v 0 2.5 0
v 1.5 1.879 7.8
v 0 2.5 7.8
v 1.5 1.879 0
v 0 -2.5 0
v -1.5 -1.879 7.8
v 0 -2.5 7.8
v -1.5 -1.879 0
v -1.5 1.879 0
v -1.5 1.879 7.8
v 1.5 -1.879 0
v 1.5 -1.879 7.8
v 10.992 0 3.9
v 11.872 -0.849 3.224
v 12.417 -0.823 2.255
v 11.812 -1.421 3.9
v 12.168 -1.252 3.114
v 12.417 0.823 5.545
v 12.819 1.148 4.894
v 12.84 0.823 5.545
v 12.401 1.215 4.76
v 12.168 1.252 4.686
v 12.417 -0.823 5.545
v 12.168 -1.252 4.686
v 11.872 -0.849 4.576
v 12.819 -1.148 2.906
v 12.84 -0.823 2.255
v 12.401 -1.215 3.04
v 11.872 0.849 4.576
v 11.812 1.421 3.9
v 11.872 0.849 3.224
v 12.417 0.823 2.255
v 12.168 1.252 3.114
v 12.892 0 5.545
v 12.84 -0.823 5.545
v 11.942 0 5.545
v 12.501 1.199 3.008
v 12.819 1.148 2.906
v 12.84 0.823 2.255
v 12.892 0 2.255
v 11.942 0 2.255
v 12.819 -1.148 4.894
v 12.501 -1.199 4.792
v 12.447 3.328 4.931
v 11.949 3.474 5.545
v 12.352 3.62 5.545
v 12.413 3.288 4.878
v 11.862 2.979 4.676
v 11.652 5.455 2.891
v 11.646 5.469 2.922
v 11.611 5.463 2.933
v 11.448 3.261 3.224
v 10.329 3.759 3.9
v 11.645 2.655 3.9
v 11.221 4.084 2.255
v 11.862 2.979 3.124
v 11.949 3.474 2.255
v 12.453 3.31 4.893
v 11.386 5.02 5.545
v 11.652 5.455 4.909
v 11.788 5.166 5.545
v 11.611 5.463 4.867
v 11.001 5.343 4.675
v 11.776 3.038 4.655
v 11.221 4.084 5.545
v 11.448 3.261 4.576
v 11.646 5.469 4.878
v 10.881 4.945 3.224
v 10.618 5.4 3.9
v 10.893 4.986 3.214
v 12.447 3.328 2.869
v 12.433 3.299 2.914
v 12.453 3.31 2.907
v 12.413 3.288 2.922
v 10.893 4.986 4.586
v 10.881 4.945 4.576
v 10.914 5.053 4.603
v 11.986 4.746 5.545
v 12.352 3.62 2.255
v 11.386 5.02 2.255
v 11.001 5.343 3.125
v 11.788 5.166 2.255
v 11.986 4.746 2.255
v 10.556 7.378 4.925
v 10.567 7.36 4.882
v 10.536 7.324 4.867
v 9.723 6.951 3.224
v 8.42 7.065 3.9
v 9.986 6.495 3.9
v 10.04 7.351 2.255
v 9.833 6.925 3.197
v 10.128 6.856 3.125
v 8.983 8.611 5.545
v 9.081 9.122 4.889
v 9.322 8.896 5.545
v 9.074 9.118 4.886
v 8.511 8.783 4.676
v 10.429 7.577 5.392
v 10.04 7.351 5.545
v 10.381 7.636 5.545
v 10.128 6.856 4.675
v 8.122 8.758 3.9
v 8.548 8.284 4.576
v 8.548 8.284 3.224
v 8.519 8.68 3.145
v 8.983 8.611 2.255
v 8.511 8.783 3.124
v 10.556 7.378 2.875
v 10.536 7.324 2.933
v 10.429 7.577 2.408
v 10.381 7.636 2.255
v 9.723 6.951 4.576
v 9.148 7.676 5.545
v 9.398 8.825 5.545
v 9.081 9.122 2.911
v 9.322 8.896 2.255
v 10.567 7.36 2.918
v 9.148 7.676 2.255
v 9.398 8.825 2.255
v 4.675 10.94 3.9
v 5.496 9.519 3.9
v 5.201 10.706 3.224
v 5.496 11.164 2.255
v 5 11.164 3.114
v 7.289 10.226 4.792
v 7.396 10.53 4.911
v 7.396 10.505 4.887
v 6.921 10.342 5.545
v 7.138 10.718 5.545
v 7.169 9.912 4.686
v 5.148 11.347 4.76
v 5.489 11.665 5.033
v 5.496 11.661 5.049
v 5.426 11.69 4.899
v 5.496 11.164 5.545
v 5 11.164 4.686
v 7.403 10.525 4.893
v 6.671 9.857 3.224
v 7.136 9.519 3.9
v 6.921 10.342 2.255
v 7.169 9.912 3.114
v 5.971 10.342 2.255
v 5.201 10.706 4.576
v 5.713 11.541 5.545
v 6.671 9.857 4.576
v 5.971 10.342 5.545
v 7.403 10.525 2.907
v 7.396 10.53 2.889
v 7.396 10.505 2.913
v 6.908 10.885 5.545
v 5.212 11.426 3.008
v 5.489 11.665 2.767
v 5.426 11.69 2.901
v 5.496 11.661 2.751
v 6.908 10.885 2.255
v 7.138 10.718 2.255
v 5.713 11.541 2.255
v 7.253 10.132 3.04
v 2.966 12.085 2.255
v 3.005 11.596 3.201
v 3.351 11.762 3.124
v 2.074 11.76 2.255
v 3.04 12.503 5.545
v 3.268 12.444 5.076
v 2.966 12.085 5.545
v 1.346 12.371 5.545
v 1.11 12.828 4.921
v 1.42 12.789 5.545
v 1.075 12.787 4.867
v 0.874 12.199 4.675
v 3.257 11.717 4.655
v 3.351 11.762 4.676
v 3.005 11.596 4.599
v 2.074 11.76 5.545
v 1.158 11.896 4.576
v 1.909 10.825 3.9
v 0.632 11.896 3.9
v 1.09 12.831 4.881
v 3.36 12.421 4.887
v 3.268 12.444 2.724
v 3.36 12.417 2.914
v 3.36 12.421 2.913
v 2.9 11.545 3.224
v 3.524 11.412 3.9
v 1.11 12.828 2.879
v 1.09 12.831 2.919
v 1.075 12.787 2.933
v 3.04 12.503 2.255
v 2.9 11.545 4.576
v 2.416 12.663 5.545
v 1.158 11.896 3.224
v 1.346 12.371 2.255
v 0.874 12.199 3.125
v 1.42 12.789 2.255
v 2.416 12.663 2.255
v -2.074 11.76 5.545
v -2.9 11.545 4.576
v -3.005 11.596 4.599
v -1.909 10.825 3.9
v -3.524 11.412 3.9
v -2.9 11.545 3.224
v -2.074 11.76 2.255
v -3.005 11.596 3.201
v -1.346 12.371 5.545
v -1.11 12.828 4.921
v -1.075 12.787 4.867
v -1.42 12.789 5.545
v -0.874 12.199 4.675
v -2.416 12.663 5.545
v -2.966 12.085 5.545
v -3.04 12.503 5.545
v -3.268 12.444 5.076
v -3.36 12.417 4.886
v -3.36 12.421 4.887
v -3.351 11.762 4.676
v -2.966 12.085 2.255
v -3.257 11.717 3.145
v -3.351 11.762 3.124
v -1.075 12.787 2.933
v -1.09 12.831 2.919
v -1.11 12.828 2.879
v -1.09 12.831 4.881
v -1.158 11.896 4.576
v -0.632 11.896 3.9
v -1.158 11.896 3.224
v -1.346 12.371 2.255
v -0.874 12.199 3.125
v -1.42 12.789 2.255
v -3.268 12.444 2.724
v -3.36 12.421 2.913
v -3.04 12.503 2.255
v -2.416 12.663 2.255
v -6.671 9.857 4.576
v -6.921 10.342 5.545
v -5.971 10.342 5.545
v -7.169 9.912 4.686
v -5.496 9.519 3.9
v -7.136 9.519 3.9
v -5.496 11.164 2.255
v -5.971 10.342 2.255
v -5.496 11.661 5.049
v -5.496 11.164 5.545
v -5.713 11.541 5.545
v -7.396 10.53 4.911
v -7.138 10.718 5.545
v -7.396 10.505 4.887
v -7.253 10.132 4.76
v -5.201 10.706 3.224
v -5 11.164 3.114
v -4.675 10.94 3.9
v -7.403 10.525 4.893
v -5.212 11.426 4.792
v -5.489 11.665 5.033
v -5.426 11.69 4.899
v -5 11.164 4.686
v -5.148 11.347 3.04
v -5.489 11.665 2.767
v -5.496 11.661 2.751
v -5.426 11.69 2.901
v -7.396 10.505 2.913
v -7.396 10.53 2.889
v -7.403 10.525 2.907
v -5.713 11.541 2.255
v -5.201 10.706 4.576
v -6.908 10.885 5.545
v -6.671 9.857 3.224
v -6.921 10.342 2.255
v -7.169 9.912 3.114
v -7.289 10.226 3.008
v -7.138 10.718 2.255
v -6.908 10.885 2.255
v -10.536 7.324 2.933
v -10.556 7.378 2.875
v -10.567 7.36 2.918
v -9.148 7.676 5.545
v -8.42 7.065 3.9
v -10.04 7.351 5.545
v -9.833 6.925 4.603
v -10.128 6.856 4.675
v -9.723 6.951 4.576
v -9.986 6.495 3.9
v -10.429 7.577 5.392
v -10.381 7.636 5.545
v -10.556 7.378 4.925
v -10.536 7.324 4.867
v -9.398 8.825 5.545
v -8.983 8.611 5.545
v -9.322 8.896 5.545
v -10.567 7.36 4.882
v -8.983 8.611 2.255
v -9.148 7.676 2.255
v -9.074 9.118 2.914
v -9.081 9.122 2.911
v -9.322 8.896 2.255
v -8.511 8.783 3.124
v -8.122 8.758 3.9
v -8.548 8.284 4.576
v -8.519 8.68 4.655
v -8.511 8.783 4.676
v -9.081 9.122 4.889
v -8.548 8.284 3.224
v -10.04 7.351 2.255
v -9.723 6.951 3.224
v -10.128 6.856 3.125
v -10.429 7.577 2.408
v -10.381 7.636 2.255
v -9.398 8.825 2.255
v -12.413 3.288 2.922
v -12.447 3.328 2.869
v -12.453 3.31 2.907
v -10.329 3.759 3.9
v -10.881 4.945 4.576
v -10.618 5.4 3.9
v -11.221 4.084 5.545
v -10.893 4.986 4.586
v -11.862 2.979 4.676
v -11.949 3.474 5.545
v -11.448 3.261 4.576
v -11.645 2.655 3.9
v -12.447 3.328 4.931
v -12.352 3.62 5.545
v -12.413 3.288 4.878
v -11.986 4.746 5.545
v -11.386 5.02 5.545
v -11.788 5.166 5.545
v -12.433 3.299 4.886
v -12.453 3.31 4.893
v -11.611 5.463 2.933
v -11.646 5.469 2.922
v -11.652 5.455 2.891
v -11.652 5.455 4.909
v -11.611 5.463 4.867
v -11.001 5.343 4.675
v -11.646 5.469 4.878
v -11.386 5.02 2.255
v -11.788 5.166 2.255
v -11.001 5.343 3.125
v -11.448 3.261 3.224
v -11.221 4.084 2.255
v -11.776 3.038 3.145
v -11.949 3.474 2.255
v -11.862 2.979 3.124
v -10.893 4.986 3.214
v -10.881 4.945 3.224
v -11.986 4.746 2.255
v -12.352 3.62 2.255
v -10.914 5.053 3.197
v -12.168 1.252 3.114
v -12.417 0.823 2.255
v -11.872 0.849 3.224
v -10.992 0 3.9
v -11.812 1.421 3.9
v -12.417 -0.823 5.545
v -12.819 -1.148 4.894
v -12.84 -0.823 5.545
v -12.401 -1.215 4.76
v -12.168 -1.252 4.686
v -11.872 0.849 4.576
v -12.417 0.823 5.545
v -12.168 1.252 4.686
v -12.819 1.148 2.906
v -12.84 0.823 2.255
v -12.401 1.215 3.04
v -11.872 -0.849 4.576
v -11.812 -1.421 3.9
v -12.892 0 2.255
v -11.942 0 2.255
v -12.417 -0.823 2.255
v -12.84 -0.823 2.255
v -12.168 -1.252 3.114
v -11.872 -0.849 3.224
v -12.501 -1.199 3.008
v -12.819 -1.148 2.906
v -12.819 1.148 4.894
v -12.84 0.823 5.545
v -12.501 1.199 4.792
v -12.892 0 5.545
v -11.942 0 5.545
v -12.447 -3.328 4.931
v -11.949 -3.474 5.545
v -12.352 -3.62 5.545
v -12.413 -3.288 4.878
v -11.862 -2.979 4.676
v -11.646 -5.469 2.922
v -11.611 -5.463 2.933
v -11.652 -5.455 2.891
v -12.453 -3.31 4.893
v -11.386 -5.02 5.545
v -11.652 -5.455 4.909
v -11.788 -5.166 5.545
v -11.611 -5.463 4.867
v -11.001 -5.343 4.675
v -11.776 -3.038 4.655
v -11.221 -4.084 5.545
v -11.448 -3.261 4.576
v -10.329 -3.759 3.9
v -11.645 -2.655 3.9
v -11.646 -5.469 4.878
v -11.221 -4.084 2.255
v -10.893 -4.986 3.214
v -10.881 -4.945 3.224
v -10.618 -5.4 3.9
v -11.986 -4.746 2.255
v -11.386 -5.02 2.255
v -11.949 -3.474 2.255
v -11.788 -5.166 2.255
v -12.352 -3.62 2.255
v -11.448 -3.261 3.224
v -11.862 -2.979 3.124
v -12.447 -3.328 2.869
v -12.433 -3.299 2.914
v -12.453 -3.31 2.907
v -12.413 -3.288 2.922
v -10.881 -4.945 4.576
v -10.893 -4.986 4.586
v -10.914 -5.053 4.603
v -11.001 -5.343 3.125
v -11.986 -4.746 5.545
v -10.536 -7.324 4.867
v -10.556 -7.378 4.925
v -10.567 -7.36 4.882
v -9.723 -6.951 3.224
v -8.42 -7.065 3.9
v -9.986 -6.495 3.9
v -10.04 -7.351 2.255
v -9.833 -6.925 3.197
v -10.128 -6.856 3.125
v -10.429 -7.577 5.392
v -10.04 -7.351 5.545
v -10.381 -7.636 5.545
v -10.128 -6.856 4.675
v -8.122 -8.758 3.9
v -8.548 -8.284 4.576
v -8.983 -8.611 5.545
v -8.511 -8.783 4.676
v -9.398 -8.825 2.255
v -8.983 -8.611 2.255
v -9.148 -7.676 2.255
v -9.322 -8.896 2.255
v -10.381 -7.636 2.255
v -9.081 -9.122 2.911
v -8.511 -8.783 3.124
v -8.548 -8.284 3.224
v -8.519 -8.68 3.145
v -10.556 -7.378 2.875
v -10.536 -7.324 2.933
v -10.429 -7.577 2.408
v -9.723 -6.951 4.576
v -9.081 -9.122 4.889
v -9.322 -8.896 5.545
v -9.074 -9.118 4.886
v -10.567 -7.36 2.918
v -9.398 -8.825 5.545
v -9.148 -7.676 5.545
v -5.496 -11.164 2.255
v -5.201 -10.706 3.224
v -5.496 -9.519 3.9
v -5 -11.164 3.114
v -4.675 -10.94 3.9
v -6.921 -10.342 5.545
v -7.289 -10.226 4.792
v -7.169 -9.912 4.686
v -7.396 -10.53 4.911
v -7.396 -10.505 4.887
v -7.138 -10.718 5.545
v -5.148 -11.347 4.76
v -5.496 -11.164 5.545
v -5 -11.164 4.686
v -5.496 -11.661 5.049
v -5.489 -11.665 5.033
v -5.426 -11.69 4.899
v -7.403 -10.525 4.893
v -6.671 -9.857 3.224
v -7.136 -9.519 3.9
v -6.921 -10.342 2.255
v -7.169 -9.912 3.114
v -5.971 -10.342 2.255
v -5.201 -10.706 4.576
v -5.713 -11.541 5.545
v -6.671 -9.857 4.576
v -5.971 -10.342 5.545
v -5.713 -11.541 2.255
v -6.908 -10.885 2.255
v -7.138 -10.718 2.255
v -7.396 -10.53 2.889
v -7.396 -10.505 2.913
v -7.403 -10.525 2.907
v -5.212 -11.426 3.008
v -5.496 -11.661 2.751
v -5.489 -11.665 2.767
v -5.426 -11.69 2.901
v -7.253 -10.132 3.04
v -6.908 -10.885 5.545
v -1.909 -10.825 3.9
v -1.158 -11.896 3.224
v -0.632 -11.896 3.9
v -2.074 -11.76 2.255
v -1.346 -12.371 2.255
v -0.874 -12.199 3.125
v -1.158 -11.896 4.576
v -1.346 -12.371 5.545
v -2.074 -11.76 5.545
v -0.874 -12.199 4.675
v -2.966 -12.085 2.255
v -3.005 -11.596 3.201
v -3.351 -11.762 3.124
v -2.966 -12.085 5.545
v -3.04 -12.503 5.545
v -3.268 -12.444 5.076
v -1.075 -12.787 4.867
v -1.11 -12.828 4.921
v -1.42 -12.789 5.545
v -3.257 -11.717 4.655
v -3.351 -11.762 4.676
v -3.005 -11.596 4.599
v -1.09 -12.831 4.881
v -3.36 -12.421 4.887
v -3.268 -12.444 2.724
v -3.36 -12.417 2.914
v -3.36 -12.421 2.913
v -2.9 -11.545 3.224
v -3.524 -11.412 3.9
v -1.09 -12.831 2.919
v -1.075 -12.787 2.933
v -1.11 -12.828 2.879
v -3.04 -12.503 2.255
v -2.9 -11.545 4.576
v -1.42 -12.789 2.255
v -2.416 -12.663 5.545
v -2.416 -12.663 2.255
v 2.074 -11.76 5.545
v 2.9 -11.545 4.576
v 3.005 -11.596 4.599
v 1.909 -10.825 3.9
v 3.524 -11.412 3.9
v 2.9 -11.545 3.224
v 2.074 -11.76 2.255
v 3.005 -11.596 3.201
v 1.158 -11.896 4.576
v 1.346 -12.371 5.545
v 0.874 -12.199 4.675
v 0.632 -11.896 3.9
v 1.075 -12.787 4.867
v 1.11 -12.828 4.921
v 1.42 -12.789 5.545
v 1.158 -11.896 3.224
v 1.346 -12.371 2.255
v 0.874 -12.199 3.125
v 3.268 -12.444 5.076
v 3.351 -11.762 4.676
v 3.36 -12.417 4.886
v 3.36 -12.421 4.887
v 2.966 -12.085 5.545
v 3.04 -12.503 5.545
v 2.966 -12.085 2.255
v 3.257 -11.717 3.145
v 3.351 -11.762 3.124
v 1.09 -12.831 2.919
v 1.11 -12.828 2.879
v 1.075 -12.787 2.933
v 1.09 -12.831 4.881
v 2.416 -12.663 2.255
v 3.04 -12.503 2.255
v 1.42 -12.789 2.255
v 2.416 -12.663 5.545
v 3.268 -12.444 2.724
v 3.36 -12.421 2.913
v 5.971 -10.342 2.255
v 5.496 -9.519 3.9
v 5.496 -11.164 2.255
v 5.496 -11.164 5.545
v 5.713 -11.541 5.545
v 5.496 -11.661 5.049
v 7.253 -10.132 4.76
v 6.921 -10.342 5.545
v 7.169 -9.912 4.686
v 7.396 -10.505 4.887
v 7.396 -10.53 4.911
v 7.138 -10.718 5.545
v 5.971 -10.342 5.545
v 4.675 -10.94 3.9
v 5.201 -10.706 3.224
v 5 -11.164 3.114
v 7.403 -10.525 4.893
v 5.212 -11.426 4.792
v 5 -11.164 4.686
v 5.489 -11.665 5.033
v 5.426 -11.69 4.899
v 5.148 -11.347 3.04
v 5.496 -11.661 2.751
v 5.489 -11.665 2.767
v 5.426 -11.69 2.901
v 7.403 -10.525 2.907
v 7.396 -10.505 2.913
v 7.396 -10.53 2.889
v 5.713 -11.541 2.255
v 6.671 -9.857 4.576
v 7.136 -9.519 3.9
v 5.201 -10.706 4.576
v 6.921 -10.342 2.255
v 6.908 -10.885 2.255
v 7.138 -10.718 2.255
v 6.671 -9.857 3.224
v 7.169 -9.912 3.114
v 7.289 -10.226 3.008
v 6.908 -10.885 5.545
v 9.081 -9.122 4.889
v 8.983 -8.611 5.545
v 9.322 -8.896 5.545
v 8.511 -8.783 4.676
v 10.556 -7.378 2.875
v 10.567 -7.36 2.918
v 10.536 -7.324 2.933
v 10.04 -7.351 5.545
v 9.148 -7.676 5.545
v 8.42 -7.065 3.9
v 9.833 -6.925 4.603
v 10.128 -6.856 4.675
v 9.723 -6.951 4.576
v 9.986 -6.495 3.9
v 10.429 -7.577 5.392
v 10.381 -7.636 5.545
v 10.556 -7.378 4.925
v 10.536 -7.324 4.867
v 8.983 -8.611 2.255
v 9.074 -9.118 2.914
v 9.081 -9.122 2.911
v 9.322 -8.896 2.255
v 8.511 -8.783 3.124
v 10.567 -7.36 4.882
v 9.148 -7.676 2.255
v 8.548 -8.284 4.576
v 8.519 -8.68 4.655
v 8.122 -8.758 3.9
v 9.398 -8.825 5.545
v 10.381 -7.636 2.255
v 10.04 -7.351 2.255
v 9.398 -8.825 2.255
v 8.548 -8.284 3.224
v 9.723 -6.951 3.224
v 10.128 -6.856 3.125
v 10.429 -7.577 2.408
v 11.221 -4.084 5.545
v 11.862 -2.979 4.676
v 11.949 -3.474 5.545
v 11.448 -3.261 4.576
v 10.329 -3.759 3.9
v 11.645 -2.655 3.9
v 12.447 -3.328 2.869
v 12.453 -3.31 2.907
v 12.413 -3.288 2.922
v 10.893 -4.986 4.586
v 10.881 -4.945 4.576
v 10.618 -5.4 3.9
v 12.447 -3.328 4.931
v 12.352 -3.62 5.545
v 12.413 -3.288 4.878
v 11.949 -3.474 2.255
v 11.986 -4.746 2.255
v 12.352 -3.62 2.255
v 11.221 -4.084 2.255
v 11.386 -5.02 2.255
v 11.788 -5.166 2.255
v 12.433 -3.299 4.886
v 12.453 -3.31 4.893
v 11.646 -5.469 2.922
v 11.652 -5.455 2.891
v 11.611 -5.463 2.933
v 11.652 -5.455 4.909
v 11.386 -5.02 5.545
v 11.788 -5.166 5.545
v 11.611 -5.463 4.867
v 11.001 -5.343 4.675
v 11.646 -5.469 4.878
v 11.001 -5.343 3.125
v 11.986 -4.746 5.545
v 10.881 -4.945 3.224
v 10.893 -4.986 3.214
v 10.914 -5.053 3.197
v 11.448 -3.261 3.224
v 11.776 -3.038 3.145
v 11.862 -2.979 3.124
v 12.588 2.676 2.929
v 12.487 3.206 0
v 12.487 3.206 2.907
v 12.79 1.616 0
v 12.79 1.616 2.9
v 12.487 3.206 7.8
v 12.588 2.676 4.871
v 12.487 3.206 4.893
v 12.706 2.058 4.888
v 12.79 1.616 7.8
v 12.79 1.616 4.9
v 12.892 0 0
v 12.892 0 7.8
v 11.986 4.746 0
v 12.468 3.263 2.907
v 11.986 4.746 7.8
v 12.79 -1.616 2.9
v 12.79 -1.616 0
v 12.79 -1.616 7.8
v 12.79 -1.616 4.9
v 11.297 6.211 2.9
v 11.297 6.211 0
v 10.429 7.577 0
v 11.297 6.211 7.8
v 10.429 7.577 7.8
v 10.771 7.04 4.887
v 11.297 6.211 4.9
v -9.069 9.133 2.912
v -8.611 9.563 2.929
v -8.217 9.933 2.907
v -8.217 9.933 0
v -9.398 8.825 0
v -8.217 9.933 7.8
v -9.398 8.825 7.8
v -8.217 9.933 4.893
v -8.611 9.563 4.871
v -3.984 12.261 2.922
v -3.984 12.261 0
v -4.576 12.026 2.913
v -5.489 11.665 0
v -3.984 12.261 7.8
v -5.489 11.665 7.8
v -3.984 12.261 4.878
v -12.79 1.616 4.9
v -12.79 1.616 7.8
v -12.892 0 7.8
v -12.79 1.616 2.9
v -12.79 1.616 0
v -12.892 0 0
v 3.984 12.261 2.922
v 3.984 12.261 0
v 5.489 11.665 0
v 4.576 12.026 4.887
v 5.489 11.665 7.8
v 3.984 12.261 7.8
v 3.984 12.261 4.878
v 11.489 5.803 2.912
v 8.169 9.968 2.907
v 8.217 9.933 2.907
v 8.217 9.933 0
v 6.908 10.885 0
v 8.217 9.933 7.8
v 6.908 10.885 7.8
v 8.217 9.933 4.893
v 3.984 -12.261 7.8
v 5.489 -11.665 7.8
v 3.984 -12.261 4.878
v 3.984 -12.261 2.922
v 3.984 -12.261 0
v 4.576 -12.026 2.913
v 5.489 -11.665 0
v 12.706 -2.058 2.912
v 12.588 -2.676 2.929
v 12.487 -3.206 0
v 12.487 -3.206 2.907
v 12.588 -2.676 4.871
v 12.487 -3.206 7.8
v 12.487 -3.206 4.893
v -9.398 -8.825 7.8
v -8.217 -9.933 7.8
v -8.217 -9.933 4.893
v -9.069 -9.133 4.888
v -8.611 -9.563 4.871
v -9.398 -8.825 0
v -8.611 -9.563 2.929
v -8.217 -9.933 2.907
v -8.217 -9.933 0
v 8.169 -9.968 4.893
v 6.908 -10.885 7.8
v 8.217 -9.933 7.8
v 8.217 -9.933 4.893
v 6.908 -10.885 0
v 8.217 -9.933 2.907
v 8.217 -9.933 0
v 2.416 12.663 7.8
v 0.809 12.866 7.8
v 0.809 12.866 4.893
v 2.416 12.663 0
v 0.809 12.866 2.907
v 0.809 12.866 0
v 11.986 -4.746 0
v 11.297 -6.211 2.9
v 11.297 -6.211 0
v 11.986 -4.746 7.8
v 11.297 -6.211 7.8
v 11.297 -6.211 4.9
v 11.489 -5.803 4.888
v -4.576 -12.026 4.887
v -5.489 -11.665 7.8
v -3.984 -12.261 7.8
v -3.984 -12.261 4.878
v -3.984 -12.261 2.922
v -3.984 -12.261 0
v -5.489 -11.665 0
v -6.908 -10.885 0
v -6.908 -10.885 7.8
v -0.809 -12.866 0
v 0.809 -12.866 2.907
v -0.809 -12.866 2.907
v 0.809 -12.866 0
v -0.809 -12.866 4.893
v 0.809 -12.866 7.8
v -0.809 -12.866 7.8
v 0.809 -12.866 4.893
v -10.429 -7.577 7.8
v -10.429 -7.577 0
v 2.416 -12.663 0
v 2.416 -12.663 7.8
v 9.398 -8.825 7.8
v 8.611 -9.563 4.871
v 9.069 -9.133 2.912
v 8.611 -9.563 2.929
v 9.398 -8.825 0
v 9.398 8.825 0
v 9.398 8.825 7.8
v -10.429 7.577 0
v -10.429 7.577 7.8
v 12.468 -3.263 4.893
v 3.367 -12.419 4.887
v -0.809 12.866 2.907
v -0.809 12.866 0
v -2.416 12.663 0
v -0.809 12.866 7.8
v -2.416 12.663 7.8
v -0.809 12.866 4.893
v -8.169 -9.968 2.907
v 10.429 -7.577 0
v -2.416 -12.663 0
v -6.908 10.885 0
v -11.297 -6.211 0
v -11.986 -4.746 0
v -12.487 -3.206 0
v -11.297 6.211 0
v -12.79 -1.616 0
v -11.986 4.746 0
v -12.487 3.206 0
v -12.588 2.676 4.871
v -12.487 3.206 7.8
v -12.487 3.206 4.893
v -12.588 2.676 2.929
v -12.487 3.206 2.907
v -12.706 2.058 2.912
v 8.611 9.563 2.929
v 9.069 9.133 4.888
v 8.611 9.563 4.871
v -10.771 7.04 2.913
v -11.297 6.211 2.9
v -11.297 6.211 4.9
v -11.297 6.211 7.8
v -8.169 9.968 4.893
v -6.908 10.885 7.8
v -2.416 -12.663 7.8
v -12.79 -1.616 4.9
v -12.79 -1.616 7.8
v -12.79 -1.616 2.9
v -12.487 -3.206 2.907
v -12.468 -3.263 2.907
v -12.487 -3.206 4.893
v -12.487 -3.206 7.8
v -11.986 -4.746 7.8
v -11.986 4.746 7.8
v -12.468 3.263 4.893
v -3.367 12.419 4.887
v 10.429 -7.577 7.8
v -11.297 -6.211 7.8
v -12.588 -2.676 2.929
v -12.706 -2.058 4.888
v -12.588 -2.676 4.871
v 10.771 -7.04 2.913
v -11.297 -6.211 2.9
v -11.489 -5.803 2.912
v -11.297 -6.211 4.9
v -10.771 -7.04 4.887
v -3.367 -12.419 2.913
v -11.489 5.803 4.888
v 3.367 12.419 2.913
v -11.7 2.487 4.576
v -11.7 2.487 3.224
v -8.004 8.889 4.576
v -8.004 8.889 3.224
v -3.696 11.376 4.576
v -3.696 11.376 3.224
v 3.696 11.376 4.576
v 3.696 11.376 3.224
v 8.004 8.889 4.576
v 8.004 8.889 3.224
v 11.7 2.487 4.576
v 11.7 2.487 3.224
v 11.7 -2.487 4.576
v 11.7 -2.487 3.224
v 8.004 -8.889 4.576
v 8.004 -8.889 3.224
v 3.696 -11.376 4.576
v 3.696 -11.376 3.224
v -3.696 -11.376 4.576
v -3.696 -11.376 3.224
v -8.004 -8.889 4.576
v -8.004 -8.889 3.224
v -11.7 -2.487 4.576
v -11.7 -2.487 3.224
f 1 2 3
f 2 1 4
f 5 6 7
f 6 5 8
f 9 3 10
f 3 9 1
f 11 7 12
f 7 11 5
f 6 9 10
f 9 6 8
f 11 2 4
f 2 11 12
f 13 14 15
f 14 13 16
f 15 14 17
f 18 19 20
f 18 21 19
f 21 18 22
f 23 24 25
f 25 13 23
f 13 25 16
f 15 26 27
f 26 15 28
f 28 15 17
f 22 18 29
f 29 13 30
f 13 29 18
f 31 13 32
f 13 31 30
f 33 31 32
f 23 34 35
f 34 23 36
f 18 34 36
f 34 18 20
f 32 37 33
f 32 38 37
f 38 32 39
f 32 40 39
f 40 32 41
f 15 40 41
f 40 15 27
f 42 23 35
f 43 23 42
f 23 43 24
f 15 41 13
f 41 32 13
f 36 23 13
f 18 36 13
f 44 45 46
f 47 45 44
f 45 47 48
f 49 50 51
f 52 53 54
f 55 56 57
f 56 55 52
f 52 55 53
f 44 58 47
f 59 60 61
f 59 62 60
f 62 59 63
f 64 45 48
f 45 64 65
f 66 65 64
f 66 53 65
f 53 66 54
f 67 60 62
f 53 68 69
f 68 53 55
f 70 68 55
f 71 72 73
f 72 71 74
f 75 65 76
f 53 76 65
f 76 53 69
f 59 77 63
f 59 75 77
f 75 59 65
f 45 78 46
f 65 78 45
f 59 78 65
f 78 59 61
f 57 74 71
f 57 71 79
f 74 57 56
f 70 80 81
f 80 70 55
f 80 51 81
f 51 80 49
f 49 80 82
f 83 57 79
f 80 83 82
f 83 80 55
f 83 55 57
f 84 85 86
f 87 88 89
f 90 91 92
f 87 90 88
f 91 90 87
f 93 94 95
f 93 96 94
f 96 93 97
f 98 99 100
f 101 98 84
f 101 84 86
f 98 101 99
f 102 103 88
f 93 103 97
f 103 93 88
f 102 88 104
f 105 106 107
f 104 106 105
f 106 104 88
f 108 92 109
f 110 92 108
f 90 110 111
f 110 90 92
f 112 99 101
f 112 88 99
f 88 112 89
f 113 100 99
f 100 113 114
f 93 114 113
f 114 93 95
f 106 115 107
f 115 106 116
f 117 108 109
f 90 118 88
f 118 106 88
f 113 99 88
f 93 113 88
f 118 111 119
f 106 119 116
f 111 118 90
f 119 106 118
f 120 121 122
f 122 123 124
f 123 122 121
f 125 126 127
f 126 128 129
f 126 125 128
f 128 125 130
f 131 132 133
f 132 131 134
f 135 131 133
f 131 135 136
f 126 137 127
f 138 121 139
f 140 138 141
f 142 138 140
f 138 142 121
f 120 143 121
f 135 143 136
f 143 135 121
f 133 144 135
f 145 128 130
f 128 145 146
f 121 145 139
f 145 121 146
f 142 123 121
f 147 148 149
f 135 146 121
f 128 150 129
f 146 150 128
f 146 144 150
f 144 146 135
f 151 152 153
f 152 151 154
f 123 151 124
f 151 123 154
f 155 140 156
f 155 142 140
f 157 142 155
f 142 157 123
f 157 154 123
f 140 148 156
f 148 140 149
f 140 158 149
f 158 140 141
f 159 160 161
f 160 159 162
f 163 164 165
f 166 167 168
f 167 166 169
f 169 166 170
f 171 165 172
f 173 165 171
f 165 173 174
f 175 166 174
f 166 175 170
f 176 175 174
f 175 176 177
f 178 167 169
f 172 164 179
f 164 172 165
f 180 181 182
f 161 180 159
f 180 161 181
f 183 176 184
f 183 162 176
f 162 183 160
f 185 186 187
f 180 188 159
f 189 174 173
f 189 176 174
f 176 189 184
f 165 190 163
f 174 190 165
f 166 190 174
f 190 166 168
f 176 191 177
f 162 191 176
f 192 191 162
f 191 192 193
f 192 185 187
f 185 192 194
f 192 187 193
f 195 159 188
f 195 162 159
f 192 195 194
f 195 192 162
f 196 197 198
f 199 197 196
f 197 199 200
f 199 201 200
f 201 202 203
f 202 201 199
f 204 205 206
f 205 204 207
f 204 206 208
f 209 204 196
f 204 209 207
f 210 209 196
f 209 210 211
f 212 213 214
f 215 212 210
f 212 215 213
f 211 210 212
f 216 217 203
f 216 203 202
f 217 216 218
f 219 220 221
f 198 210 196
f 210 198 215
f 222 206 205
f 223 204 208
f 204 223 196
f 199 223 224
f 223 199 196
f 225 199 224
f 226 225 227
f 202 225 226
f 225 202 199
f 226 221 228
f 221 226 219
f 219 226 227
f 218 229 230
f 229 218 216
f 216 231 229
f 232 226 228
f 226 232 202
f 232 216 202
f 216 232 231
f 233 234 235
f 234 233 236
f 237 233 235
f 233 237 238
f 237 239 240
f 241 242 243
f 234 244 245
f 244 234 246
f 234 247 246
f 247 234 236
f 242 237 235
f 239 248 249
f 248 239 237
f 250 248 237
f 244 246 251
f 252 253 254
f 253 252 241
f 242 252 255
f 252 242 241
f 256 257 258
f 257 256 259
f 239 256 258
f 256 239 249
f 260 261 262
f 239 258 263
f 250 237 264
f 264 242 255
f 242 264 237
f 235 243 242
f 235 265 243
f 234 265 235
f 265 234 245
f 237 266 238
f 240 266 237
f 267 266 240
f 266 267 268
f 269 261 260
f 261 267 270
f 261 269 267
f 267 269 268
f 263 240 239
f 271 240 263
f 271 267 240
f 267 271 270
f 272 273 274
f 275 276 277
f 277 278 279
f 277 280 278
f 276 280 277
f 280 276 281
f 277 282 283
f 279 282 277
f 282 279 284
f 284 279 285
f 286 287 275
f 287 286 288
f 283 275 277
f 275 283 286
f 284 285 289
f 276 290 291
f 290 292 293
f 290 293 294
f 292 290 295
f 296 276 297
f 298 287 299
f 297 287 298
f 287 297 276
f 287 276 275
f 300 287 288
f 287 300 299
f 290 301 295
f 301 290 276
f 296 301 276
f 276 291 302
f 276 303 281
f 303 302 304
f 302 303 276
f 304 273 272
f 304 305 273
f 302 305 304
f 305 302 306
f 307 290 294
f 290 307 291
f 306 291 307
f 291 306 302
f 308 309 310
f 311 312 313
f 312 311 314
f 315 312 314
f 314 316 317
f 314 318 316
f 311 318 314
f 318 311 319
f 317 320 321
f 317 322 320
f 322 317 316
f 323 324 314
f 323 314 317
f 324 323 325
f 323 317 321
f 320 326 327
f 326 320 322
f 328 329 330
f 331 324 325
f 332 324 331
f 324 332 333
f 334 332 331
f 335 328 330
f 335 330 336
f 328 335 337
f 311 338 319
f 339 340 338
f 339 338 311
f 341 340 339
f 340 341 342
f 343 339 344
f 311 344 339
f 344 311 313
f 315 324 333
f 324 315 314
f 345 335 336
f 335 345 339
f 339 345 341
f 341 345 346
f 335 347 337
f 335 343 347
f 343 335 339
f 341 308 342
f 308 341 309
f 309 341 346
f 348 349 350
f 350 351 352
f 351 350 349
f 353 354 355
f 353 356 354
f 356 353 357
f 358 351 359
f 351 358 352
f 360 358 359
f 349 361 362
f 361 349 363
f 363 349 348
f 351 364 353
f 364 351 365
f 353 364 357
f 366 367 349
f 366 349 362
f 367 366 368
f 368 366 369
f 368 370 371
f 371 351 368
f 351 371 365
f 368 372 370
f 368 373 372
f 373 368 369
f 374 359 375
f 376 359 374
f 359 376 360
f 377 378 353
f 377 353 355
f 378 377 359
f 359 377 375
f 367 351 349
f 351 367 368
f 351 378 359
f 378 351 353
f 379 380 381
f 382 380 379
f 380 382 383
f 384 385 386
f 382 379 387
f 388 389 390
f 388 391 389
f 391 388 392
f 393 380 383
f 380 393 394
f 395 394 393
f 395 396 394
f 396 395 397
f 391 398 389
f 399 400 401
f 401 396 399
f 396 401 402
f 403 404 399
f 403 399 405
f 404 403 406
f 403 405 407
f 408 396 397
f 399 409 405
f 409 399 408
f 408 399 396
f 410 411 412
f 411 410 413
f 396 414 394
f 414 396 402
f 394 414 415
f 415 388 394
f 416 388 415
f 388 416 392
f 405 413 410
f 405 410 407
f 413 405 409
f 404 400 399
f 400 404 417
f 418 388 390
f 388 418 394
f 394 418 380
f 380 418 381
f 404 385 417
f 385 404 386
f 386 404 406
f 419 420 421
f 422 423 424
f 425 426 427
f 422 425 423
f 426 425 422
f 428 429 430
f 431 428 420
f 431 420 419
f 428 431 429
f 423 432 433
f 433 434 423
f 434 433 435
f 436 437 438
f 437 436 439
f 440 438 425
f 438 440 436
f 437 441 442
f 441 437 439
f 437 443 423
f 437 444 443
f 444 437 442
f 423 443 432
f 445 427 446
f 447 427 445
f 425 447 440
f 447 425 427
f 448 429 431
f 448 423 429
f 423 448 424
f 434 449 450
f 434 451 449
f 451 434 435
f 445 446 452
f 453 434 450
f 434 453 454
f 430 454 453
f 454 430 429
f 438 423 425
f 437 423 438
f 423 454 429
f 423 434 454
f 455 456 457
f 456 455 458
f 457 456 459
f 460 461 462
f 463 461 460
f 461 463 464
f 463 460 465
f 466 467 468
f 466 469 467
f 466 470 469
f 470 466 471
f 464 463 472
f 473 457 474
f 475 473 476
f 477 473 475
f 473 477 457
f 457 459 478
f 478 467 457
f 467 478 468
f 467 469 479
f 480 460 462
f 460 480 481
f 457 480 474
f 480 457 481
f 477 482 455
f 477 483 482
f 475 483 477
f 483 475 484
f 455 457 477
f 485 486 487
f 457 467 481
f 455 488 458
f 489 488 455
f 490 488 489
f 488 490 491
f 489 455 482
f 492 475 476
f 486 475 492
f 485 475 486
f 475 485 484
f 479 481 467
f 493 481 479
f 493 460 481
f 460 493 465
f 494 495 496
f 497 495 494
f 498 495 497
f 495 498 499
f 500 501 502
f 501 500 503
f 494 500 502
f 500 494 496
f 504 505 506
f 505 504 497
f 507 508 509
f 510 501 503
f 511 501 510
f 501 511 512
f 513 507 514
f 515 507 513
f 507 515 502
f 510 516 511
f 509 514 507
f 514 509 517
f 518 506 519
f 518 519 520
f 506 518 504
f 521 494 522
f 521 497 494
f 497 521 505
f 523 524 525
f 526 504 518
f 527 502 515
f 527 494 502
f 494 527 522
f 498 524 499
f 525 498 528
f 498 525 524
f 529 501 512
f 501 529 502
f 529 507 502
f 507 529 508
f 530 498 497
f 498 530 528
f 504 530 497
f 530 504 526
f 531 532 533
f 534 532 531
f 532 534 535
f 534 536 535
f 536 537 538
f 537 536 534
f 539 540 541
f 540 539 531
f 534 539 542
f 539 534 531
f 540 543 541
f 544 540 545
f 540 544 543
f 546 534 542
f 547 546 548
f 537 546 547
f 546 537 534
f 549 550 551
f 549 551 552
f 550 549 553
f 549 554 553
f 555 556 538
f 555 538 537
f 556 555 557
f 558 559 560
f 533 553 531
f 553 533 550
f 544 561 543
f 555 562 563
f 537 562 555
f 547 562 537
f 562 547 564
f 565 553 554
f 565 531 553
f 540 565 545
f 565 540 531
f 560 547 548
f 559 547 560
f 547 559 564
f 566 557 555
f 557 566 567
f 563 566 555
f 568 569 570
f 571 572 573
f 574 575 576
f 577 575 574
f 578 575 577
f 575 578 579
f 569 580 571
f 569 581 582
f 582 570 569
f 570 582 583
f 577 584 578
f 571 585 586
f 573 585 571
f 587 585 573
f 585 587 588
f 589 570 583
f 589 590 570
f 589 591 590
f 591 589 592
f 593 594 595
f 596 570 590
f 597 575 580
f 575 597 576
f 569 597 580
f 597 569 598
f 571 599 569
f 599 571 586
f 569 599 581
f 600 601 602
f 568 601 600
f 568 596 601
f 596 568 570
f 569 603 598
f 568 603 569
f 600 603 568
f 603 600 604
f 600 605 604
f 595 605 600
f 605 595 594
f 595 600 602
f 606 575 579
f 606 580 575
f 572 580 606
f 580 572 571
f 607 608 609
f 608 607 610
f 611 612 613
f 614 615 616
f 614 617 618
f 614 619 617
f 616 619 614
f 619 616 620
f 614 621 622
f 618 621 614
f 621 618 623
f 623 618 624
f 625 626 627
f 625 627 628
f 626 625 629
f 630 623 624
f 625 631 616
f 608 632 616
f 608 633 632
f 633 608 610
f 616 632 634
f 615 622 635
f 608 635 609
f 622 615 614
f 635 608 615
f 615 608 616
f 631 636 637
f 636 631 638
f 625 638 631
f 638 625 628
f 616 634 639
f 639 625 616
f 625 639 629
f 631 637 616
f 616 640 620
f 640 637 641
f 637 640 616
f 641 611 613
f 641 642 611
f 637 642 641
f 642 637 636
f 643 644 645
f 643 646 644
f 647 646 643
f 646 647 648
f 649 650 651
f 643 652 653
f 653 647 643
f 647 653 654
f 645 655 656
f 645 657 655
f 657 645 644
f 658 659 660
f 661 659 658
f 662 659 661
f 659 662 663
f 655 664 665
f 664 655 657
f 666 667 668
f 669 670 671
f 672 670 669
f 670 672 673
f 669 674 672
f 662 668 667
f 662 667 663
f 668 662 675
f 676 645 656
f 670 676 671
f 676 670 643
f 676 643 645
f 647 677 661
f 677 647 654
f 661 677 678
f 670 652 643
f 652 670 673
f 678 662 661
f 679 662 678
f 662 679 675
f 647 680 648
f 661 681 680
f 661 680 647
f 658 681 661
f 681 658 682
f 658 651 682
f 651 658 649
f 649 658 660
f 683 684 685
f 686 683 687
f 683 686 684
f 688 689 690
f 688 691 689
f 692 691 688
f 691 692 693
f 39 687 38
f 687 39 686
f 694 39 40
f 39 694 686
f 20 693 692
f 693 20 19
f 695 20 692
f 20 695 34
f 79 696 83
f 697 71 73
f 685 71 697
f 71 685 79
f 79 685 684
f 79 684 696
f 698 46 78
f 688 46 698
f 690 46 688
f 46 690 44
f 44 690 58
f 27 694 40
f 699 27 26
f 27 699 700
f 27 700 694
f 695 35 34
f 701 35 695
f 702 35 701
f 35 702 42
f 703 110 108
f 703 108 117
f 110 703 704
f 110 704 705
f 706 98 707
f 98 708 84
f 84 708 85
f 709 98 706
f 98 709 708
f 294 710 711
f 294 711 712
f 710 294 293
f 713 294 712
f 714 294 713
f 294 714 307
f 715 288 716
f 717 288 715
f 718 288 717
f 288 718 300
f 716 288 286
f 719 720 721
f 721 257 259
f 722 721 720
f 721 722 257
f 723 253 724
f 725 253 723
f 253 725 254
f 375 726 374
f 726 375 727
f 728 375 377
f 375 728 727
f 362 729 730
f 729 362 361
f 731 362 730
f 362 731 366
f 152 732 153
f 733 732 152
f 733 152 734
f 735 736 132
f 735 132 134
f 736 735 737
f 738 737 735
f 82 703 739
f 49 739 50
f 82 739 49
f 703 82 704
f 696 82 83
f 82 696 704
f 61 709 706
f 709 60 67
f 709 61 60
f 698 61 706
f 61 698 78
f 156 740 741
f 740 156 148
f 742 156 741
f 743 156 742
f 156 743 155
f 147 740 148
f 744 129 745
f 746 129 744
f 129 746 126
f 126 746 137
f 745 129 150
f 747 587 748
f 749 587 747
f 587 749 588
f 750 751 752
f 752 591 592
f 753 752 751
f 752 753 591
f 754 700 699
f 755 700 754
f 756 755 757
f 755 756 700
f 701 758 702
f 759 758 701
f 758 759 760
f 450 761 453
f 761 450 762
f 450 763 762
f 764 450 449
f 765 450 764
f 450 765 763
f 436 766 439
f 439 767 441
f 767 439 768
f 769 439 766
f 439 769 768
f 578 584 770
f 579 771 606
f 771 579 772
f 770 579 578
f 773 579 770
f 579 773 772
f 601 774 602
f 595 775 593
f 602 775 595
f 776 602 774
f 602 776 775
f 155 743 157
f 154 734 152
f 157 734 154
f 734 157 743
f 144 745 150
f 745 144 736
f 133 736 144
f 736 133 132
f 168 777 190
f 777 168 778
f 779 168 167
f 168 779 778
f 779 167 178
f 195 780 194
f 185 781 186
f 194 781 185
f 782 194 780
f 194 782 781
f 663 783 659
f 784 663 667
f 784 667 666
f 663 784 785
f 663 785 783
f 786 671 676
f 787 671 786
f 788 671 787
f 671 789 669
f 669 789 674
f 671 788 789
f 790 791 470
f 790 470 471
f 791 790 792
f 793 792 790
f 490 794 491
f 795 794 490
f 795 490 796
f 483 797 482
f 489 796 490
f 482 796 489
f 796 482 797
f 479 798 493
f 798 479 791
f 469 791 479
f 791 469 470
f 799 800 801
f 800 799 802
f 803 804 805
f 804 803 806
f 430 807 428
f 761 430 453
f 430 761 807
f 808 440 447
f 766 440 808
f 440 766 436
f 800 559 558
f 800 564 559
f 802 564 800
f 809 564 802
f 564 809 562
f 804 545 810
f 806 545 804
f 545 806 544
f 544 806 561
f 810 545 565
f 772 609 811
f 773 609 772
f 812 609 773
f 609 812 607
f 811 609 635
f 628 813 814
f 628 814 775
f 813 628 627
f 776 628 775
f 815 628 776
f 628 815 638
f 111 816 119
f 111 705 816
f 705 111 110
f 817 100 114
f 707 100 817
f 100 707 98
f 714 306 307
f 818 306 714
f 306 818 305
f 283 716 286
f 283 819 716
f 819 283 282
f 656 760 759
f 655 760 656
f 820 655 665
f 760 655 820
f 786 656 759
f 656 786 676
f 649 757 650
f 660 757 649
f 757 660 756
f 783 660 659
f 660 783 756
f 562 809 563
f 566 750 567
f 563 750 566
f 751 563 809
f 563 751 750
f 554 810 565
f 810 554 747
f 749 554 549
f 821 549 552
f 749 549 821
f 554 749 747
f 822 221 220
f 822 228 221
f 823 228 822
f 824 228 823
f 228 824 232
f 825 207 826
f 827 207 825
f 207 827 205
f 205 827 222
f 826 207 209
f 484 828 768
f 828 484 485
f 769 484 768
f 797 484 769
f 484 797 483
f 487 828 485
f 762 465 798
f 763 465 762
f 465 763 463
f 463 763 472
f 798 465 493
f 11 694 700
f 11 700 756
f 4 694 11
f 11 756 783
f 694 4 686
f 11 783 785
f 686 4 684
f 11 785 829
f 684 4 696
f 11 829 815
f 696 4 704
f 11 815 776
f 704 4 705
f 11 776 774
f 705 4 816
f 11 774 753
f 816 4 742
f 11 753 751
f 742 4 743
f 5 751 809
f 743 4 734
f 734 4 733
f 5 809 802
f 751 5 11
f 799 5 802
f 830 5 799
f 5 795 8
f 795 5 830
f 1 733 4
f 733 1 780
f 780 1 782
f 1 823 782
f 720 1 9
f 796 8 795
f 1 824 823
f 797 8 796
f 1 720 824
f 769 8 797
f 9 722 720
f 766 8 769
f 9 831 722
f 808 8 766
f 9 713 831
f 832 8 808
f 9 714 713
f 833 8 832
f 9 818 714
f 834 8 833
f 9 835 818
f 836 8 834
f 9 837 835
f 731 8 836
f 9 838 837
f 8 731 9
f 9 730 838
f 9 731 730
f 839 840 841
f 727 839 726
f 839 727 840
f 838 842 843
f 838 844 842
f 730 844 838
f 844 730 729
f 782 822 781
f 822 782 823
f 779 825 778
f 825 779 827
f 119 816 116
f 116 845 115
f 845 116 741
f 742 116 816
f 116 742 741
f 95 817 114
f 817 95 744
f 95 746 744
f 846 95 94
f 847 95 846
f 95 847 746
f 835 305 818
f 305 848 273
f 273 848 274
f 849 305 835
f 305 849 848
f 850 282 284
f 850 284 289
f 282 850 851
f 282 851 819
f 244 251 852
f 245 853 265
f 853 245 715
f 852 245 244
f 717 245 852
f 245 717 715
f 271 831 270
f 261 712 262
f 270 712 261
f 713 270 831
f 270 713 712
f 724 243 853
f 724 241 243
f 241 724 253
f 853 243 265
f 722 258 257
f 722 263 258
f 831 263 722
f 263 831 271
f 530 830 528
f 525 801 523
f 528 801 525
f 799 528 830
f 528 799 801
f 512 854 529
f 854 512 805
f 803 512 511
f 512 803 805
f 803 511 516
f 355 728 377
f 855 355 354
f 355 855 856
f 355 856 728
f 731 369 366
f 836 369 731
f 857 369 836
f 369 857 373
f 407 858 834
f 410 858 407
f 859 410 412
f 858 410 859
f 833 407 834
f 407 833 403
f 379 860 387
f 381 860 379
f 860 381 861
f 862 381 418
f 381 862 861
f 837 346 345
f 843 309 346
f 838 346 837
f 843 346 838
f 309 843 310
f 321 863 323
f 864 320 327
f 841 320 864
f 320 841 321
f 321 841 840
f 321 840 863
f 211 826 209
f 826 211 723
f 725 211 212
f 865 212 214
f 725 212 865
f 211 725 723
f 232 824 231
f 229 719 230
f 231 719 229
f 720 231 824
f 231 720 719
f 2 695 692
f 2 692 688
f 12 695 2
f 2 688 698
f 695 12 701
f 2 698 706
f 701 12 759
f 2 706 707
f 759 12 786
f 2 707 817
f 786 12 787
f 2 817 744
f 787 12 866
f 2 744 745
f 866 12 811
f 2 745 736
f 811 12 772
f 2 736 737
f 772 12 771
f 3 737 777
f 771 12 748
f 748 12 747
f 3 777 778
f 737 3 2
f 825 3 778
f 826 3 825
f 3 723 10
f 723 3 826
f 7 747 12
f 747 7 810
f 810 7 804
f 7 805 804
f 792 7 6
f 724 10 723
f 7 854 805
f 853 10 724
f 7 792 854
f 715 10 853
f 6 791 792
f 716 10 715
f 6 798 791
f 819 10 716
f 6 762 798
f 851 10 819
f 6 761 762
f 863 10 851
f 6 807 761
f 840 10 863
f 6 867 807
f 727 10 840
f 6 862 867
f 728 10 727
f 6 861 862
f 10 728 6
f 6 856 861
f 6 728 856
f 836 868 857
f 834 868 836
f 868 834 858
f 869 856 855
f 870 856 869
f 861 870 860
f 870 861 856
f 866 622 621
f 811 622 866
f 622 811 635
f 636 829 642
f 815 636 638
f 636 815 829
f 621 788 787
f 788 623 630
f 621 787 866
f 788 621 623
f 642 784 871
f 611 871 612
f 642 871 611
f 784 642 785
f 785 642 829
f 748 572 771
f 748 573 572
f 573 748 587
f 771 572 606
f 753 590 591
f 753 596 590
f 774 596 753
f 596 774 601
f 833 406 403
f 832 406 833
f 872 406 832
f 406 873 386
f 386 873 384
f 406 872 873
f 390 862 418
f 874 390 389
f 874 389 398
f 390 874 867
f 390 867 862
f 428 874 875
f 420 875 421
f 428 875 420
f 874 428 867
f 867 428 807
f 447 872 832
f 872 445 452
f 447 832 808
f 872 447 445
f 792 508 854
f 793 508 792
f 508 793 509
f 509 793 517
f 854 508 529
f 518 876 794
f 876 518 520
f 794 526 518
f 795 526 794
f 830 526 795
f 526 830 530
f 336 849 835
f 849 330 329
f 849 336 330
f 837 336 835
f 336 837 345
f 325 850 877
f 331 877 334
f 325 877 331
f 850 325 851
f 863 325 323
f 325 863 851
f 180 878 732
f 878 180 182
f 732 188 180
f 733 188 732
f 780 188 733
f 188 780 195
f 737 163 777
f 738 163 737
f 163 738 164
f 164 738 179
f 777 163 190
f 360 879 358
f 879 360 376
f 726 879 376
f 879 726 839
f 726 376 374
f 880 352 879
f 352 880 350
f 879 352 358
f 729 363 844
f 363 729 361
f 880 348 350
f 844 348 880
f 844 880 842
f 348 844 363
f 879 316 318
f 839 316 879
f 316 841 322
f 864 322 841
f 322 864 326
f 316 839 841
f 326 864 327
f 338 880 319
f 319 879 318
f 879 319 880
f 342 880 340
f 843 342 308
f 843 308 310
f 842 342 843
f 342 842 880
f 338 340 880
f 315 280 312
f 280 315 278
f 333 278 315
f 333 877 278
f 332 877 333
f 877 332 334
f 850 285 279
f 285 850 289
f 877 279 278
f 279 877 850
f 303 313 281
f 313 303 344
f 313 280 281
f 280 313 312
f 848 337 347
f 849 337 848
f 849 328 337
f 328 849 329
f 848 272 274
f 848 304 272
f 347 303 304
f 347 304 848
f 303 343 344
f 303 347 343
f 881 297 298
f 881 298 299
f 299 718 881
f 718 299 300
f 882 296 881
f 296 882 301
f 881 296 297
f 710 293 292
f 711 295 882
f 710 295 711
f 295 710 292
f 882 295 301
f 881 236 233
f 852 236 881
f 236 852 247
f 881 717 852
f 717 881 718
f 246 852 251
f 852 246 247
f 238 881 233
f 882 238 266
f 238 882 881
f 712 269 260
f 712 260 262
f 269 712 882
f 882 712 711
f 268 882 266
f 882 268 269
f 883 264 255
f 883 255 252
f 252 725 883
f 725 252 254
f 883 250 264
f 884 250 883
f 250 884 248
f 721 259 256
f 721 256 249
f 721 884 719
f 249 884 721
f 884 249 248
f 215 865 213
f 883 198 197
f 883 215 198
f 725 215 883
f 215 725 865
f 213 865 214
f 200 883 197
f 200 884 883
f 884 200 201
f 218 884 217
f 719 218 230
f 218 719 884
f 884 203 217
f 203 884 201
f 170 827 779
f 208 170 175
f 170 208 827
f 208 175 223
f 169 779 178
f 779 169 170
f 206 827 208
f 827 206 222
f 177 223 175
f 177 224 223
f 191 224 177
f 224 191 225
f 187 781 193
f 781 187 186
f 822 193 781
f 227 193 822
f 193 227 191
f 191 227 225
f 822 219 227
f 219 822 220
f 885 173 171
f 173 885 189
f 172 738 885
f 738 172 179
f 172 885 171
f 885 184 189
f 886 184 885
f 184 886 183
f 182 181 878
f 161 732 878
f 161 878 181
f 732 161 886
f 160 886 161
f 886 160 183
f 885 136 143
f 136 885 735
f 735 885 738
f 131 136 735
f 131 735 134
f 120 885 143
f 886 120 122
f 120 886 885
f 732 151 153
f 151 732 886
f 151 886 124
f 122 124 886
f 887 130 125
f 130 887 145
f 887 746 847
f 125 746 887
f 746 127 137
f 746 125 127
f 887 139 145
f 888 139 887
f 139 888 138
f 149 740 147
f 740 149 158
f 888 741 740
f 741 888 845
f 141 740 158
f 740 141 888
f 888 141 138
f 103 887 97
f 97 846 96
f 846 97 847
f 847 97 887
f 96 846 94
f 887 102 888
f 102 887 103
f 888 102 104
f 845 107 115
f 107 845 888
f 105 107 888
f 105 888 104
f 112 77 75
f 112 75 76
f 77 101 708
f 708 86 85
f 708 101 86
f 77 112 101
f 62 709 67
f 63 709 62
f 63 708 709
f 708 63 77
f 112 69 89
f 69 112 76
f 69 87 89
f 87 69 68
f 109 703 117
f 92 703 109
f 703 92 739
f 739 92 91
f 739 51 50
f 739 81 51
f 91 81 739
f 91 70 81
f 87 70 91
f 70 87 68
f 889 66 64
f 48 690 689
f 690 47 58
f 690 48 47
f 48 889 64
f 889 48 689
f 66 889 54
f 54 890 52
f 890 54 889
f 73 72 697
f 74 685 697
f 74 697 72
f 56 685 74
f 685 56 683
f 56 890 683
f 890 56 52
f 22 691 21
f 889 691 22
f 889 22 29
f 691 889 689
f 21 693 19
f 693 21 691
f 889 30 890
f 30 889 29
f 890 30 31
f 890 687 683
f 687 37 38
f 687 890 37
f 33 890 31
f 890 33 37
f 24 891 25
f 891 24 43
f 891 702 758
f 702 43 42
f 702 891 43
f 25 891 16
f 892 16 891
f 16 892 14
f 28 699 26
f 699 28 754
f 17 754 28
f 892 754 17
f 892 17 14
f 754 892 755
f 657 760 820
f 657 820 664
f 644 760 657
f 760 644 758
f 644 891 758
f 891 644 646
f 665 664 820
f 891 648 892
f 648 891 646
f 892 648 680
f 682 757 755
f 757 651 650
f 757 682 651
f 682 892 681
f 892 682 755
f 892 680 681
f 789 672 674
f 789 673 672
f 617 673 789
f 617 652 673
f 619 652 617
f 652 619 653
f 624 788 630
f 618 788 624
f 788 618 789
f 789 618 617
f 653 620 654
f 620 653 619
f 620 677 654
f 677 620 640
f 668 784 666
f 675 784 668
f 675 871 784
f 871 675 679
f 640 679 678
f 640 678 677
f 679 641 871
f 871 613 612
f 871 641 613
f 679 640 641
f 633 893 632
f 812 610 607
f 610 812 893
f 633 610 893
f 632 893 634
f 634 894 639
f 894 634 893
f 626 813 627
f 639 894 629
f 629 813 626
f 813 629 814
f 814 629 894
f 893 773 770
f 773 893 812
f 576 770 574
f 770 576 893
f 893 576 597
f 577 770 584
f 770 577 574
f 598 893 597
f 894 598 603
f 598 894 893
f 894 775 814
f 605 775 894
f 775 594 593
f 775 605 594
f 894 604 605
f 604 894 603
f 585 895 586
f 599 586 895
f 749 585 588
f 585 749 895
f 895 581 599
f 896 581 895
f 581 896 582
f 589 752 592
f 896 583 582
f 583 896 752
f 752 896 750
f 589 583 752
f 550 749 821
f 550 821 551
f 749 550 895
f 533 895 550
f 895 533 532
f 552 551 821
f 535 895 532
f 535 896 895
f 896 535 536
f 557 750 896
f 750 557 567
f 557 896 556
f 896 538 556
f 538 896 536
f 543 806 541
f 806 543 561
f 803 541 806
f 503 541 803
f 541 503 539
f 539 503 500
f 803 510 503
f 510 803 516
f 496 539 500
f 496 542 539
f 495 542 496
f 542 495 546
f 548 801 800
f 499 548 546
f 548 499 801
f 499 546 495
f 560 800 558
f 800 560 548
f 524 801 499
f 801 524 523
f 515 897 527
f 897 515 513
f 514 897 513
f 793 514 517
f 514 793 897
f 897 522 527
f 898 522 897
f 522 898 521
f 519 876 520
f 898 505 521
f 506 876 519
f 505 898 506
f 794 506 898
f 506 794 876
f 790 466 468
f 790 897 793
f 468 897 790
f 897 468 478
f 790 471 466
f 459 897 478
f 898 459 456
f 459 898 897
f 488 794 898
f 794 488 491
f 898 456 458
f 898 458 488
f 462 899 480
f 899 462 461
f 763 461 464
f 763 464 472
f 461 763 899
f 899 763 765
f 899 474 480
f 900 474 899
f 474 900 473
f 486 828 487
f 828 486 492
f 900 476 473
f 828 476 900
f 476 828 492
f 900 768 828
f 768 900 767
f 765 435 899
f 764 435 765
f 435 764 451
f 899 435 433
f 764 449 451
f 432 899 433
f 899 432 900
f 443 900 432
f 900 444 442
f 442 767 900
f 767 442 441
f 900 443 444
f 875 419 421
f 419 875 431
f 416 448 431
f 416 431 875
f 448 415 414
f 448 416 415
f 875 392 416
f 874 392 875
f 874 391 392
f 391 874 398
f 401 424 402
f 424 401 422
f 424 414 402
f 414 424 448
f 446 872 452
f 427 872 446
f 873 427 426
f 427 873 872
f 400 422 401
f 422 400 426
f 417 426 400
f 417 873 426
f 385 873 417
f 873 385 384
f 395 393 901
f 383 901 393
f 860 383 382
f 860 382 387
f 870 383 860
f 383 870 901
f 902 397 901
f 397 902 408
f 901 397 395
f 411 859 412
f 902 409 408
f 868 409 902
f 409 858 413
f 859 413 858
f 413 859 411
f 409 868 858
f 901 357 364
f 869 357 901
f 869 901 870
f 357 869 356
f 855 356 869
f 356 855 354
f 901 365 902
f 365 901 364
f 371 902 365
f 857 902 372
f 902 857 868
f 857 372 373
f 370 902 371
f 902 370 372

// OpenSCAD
PI = 3.141592653589793;

beadDiameter = 3.8;
beadDistance = 4.5;
chainDiameter = 2.3;
beadsAlongGearDiameter = 36;

motorShaftDiameter = 5;
motorShaftSideInset = 1;

edgeThickness = 2;

circumference = beadsAlongGearDiameter*beadDistance;
gearDiameter = circumference/(2*PI);
beadAngle = beadDistance/(gearDiameter/2*(PI/180));
totalThickness = beadDiameter+edgeThickness*2;

echo ("gearDiameter", gearDiameter);

difference() {
	cylinder(totalThickness, gearDiameter/2, gearDiameter/2, $fn = 50);
	translate([0,0,-1]) motorShaft(totalThickness+2, motorShaftDiameter, motorShaftSideInset, motorShaftSideInset);
	translate([0,0,totalThickness/2]) beadChainCutout(gearDiameter, chainDiameter);
	translate([0,0,totalThickness/2]) beadCutout(gearDiameter, beadDiameter, beadAngle);
}

module beadChainCutout(loopDiameter, chainDiameter) {
	rotate_extrude(convexity = 4) translate([loopDiameter/2, 0, 0]) circle(r = chainDiameter/2);
}

module beadCutout(loopDiameter, beadDiameter, beadAngle) {
	union()
	for(i = [0:360/beadAngle-1]) {
		rotate(i*beadAngle, [0,0,1]) translate([loopDiameter/2,0]) sphere(beadDiameter/2);
	}	
}

module motorShaft(length, diameter, leftSideInset, rightSideInset, extra=0.1) {
	difference() {
		cylinder(length, diameter/2, diameter/2);
		translate([-diameter/2-extra, -diameter/2-extra, -extra]) cube([leftSideInset+extra, diameter+extra*2, length+2]);
		translate([diameter/2-rightSideInset, -diameter/2-extra, -extra]) cube([rightSideInset+extra, diameter+extra*2, length+2]);
	}
}
